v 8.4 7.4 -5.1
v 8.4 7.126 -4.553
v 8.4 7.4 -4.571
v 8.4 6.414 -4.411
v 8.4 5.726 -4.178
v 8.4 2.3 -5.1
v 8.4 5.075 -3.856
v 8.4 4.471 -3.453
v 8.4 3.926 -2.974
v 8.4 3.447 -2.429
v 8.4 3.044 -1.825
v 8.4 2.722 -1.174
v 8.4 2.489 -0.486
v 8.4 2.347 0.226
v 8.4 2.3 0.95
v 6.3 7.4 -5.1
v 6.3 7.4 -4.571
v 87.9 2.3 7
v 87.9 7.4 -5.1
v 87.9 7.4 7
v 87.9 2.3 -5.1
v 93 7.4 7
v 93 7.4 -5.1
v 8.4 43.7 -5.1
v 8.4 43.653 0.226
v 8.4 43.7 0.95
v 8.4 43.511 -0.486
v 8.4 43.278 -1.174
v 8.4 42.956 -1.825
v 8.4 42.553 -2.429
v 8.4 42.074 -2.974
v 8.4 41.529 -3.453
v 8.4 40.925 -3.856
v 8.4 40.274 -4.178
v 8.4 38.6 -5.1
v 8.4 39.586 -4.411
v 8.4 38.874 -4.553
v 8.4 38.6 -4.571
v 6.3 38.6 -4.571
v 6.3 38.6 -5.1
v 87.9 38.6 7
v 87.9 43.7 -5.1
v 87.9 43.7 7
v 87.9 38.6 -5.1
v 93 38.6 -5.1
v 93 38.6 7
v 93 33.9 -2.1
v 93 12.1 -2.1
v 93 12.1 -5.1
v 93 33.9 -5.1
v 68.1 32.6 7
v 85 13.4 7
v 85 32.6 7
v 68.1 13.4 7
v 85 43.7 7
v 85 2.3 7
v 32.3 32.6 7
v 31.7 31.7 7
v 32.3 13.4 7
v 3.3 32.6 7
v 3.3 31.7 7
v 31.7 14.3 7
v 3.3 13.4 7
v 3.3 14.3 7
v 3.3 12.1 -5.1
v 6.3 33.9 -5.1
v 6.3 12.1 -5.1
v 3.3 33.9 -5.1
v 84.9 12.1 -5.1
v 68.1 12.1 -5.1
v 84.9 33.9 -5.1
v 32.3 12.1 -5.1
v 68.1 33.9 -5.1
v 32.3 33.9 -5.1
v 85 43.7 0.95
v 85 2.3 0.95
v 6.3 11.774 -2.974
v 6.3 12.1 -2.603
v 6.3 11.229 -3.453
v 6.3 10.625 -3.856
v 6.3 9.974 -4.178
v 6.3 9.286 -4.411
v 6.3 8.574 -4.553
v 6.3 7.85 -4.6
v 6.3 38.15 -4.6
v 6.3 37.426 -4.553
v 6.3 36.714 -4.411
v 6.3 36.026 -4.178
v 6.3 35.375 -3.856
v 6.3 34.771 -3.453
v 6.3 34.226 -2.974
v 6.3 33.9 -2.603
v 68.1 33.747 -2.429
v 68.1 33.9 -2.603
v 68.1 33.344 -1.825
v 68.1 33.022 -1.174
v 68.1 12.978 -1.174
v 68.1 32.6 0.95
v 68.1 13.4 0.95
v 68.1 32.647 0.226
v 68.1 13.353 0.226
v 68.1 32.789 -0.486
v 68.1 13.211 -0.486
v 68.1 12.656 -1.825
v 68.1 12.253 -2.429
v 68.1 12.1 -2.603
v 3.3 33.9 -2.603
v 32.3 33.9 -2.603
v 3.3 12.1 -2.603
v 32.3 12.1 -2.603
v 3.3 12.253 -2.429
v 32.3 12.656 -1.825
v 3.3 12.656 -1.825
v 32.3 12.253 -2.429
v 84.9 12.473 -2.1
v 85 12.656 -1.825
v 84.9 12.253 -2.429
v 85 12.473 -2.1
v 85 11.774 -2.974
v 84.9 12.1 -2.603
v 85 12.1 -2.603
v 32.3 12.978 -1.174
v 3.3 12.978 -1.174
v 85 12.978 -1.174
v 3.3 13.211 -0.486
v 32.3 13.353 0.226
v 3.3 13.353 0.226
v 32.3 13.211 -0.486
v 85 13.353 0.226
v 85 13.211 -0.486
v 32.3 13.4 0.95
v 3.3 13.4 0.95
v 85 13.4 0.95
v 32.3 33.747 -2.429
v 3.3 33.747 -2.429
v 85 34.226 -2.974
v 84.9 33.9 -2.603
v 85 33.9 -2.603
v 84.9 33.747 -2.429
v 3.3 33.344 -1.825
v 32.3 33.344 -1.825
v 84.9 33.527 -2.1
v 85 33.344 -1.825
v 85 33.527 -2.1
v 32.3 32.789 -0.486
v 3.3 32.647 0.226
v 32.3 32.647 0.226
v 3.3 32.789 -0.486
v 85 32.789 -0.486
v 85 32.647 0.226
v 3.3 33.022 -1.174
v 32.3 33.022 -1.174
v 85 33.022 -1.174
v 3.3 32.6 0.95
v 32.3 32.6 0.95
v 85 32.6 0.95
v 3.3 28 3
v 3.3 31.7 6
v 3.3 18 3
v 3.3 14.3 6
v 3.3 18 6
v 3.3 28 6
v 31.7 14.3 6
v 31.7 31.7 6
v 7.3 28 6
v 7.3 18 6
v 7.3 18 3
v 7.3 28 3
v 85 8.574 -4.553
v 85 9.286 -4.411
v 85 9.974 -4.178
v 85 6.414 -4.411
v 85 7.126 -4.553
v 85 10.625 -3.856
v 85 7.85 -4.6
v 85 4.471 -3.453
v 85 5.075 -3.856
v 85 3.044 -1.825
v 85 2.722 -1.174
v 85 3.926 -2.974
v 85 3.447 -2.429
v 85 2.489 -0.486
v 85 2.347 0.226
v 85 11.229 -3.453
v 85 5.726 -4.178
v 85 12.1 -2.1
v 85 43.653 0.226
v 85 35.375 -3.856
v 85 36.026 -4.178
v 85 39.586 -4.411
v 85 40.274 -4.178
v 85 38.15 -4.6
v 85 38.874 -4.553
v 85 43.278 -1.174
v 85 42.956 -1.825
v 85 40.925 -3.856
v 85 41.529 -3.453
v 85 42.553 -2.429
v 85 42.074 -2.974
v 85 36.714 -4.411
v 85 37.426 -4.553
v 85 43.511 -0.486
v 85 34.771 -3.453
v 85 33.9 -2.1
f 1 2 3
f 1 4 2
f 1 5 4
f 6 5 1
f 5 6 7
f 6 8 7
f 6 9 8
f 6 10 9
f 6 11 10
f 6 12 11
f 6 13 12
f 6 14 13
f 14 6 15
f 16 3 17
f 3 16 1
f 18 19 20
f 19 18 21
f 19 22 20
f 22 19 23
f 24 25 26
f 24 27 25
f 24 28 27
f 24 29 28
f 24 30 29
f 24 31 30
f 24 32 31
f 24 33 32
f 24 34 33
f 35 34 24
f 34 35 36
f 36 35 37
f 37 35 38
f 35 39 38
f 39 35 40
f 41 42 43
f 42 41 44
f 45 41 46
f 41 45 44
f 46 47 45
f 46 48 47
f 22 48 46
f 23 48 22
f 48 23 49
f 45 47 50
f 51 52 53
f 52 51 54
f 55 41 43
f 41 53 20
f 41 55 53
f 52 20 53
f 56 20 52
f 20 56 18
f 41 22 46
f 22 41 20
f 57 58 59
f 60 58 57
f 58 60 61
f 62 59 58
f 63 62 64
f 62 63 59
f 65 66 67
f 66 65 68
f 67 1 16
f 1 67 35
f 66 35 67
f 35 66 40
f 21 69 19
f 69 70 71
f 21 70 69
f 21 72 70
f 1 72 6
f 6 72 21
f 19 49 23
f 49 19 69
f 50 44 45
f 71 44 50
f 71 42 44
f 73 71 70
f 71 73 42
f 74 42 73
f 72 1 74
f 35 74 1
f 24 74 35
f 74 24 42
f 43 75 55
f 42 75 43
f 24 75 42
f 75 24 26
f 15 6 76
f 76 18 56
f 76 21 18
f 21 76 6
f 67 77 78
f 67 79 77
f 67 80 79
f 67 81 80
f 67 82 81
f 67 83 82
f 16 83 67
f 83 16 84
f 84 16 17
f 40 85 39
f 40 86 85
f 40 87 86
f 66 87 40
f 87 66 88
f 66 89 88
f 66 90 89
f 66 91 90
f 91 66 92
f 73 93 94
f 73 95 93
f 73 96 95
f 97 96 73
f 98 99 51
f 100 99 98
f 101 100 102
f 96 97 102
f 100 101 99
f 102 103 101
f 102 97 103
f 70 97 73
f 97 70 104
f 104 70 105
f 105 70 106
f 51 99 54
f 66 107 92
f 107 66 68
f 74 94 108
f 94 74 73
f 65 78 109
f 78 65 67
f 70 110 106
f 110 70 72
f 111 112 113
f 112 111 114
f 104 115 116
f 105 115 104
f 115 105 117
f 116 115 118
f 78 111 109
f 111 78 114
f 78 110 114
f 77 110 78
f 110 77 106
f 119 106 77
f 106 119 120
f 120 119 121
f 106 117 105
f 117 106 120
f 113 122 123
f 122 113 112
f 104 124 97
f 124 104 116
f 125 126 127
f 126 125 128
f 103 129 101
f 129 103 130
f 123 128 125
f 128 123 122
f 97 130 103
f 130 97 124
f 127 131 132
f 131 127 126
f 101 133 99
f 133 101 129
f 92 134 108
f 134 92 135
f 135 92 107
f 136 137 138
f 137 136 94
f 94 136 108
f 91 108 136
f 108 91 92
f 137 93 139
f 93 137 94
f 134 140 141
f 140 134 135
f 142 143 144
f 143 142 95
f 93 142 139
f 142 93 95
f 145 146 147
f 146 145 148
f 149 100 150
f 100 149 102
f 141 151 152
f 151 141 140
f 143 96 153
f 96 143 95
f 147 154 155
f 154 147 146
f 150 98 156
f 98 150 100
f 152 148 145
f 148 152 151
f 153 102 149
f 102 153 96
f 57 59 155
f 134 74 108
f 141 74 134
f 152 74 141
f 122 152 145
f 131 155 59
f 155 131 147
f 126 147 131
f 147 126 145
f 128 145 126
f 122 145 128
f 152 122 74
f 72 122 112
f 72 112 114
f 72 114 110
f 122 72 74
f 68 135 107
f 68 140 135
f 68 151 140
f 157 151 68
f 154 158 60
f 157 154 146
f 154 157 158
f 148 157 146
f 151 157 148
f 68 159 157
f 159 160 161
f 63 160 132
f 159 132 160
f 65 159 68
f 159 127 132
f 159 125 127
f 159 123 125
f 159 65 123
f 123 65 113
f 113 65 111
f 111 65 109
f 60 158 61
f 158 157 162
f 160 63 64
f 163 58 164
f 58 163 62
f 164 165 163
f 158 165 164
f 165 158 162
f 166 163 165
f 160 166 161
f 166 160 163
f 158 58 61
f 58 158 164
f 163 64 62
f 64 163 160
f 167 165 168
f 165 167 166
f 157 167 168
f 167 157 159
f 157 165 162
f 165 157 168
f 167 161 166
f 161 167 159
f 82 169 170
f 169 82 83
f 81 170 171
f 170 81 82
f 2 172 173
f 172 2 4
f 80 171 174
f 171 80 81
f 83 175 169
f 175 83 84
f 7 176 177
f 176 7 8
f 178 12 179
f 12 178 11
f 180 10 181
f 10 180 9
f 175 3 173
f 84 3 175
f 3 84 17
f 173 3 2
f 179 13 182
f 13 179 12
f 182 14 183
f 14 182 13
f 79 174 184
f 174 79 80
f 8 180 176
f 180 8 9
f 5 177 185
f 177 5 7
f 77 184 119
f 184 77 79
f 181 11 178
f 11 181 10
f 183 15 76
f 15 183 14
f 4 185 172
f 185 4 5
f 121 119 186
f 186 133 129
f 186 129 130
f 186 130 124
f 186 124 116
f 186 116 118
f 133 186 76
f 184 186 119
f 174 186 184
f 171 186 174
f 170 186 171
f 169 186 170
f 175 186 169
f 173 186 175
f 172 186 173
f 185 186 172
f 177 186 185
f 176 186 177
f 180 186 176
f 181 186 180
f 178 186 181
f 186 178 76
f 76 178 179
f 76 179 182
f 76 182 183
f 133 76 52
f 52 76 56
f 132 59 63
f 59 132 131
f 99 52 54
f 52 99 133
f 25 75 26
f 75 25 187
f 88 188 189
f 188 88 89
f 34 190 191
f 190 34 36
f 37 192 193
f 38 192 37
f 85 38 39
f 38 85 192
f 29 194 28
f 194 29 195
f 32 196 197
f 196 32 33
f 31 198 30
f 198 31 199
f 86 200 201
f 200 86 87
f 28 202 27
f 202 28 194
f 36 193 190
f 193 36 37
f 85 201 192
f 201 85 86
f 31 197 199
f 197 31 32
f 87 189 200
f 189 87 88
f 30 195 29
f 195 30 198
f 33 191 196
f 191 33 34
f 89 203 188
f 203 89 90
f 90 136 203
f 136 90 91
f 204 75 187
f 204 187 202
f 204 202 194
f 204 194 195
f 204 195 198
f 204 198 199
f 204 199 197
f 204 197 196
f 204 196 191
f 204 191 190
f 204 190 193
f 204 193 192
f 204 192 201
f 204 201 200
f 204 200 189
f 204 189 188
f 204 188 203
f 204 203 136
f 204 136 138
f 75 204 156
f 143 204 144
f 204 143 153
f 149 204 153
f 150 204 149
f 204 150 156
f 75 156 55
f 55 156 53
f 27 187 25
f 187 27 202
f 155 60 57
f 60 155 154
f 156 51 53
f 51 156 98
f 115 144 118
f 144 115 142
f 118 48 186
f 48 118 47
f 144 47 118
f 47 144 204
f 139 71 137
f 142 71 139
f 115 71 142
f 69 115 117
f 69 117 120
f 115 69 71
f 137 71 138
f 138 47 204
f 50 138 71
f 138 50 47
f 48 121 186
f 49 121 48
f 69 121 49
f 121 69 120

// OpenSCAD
// Dilder Rev 2 "extended with joystick" — AAA CRADLE INSERT v1
//
// A drop-in plug shaped like the NEGATIVE SPACE of top-cover-windowed-
// screen-inlay-v3-2piece's interior. Slides up into the cover's mating
// bottom; top surface lands flush against the face-plate/display-back
// plane at cover-local z = 7 ("the plane of the screen face").
//
// Features carved INTO the plug:
//   - 3 mm-wide FPC gap on the -X (opposite-the-joystick) edge, full Y
//     and full Z, so the display's FPC cable can exit toward -X.
//   - 2 AAA cell indentations laid along X, stacked in Y, pushed to the
//     +X (joystick-side) end of the plug.
//   - Central rectangular cutout that lets the Pico W nest up against
//     the Waveshare's back, between the two AAA cells.
//
// Plug height is set by the AAA diameter (10.5 mm + 0.3 slop per side →
// 11.1 mm bay) rather than the cover's 7 mm inner cavity — so the plug
// is TALLER than the cover's cavity. Its top 7 mm slide into the cover
// cavity; the bottom 4.6 mm extends BELOW the cover mating plane, into
// the base's Pico-chamber region (Y = 12.1–33.9), which is open there.
//
// Export:
//   openscad -o aaa-cradle-insert-v1.3mf aaa-cradle-insert-v1.scad

$fn = 48;

// ============================================================
// Match the cover / base shell parameters
// ============================================================
enclosure_outer_width_along_x_axis_mm          = 94.5;   // was 91.5 — +3 mm on -X side for TP4056
enclosure_outer_depth_along_y_axis_mm          = 46;
minus_x_end_wall_thickness_mm                  = 3.0;
plus_x_end_wall_thickness_mm                   = 1.2;
perimeter_long_side_wall_thickness_y_mm_base   = 2;
corner_pillar_square_side_length_mm            = 5;

// Cover cavity inner bounds (the space the plug fills)
cavity_inner_x_start_mm = minus_x_end_wall_thickness_mm;                         // = 3.0
cavity_inner_x_end_mm =
    enclosure_outer_width_along_x_axis_mm
      - plus_x_end_wall_thickness_mm;                                            // = 90.3
cavity_inner_y_start_mm = perimeter_long_side_wall_thickness_y_mm_base;          // = 2.0
cavity_inner_y_end_mm =
    enclosure_outer_depth_along_y_axis_mm
      - perimeter_long_side_wall_thickness_y_mm_base;                            // = 44.0

// Plug outer footprint = cavity − a tiny slide-in slop on every wall.
plug_wall_slop_mm                              = 0.3;
plug_x_start_mm = cavity_inner_x_start_mm + plug_wall_slop_mm;                   // = 3.3
plug_x_end_mm   = cavity_inner_x_end_mm   - plug_wall_slop_mm;                   // = 90.0
plug_y_start_mm = cavity_inner_y_start_mm + plug_wall_slop_mm;                   // = 2.3
plug_y_end_mm   = cavity_inner_y_end_mm   - plug_wall_slop_mm;                   // = 43.7

// ============================================================
// Plug Z — top meets the face-plate bottom (= display back = "plane of
// screen face"), bottom extends below cover mating bottom as needed to
// fully cradle the AAAs.
// ============================================================
face_plate_bottom_z_in_cover_local_mm          = 7;     // from cover-v3-2piece
aaa_cell_diameter_mm                           = 10.5;
aaa_cell_radial_slop_mm                        = 0.3;
aaa_bay_diameter_mm =
    aaa_cell_diameter_mm + 2 * aaa_cell_radial_slop_mm;  // = 11.1
aaa_bay_wall_above_and_below_mm                = 0.5;    // min wall at ±Z of cell

plug_thickness_mm =
    aaa_bay_diameter_mm + 2 * aaa_bay_wall_above_and_below_mm;  // = 12.1
plug_top_z_mm = face_plate_bottom_z_in_cover_local_mm;          // = 7
plug_bottom_z_mm = plug_top_z_mm - plug_thickness_mm;           // = -5.1 (extends
                                                                 // into base below)

// ============================================================
// AAA cells — 2 cells laying along X, stacked in Y, both pushed to
// +X (the joystick side). Cell-to-cell divider 1 mm thick.
// ============================================================
aaa_cell_length_mm                             = 44.5;
aaa_cell_axial_slop_mm                         = 1.0;
aaa_cell_contact_space_per_end_mm              = 2.0;
aaa_bay_length_along_x_mm =
    aaa_cell_length_mm
      + 2 * aaa_cell_contact_space_per_end_mm
      + aaa_cell_axial_slop_mm;                          // = 49.5

// +X end of the bay is pulled 3 mm -X past the +X corner-pillar
// cutout's -X edge, so the bays don't run into the pillar footprint.
plus_x_pillar_cutout_minus_x_edge_mm =
    (enclosure_outer_width_along_x_axis_mm
       - plus_x_end_wall_thickness_mm
       - corner_pillar_square_side_length_mm)
      - 0.4;                                                                      // = 84.9 (slop applied below)
aaa_bay_gap_from_pillar_cutout_mm              = 3.0;
aaa_bay_plus_x_end_mm =
    plus_x_pillar_cutout_minus_x_edge_mm
      - aaa_bay_gap_from_pillar_cutout_mm;                                         // = 81.9
aaa_bay_minus_x_start_mm =
    aaa_bay_plus_x_end_mm - aaa_bay_length_along_x_mm;                             // = 32.4

// Bays pushed apart until each cell's outer surface touches the plug's
// long-side edge. Cover / base inner wall provides +/-Y retention
// outside the plug.
aaa_bay_minus_y_center_y_mm =
    plug_y_start_mm + aaa_bay_diameter_mm / 2;                                     // = 7.85
aaa_bay_plus_y_center_y_mm =
    plug_y_end_mm - aaa_bay_diameter_mm / 2;                                       // = 38.15
aaa_bay_center_z_mm =
    (plug_top_z_mm + plug_bottom_z_mm) / 2;                                        // ≈ 0.95

// Top-open cut: the plug material from the cell's equator up through
// the plug top gets removed in each bay's XY bounding box, so the cell
// can be placed INTO the bay from above rather than slid in end-on.
aaa_bay_top_open_z_bottom_mm                   = aaa_bay_center_z_mm;
aaa_bay_top_open_z_top_mm                      = plug_top_z_mm + 0.1;

// ============================================================
// FPC gap — 3 mm of -X edge material shaved off, full Y, full plug Z,
// so the display's FPC cable can exit straight toward -X.
// ============================================================
fpc_gap_width_along_x_mm                       = 3;

// ============================================================
// Pico nest — central rectangular cutout from the TOP of the plug
// downward. Gives the Pico W somewhere to sit against the Waveshare's
// back (between the two AAA cells).
// ============================================================
pico_w_board_width_along_y_mm                  = 21.0;
// Pico nest length reduced 10 mm (from 51 to 41) so the middle block
// doesn't eat quite as far +X into the plug.
pico_w_board_length_along_x_mm                 = 61.0;
print_fit_tolerance_slop_mm                    = 0.4;
pico_nest_width_along_y_mm =
    pico_w_board_width_along_y_mm + 2 * print_fit_tolerance_slop_mm;              // = 21.8
pico_nest_length_along_x_mm =
    pico_w_board_length_along_x_mm + 2 * print_fit_tolerance_slop_mm;             // = 51.8
// Pico board + its tallest stacked components (headers) — full plug Z
// so the Pico nests all the way through vertically, free to sit against
// the Waveshare's back above and extend down toward the base below.
pico_nest_depth_along_z_mm                     = plug_thickness_mm;

// Pico nest is X-centered between the FPC gap and the AAA bays (so the
// Pico sits in the middle of the -X / +X extent of the plug).
pico_nest_x_region_start_mm =
    plug_x_start_mm + fpc_gap_width_along_x_mm;                                   // = 6.3
pico_nest_x_region_end_mm   = aaa_bay_minus_x_start_mm;                           // = 40.5
pico_nest_x_start_mm =
    (pico_nest_x_region_start_mm + pico_nest_x_region_end_mm) / 2
      - pico_nest_length_along_x_mm / 2;                                          // = -2.5 (overshoots)
// If the Pico's 51.8 mm footprint doesn't fit between the FPC gap end
// (x = 6.3) and the AAA bays' -X start (x = 40.5 → 34.2 mm of X), the
// nest gets clamped to start at the FPC gap end and extends as far +X
// as the board needs. The Pico ends up passing UNDER the AAA bays'
// footprint; since the bay pockets are higher in Z than the Pico nest
// bottom, that's fine — the Pico's -X end fills the plug's center and
// its +X end slides under the AAA bays.
pico_nest_x_start_clamped_mm =
    max(pico_nest_x_start_mm, pico_nest_x_region_start_mm);
pico_nest_y_start_mm =
    enclosure_outer_depth_along_y_axis_mm / 2
      - pico_nest_width_along_y_mm / 2;                                           // = 12.1

// ============================================================
// -X middle inset — a shallow pocket on the -X end of the plug's long
// axis, mirroring the Pico-nest footprint but only 9.5 mm long in X
// and 3 mm shorter in height than the full plug so it's a blind pocket
// rather than a through-slot. Opens from the top.
// ============================================================
minus_x_inset_length_along_x_mm                = 29;     // was 9.5 — extended for TP4056 board (28 mm + margin)
minus_x_inset_height_reduction_from_plug_mm    = 0;      // was 3.0 — full plug height now
minus_x_inset_depth_along_z_mm =
    plug_thickness_mm - minus_x_inset_height_reduction_from_plug_mm;               // = 9.1
minus_x_inset_x_start_mm                       = plug_x_start_mm;                  // = 3.3
minus_x_inset_x_end_mm =
    minus_x_inset_x_start_mm + minus_x_inset_length_along_x_mm;                    // = 12.8
minus_x_inset_y_start_mm                       = pico_nest_y_start_mm;             // = 12.1
minus_x_inset_y_end_mm =
    minus_x_inset_y_start_mm + pico_nest_width_along_y_mm;                         // = 33.9
minus_x_inset_z_top_mm                         = plug_top_z_mm;                    // = 7.0
minus_x_inset_z_bottom_mm =
    minus_x_inset_z_top_mm - minus_x_inset_depth_along_z_mm;                       // = -2.1

// ============================================================
// Connecting block — solid material ADDED on the +X edge of the -X
// inset (the edge opposite the plug edge closest to the origin).
// Bridges the -X inset region into the rest of the plug, filling part
// of the Pico-nest footprint back in. Same Y band and Z depth as the
// -X inset; 9.5 mm long in X; 9.1 mm tall (3 mm shorter than full
// plug Z), so it leaves a 3 mm gap below the block inside the Pico
// nest (a small cable-pass channel at the bottom).
// ============================================================
connecting_block_length_along_x_mm             = 29;     // was 9.5 — accommodate TP4056 (28 mm board + margin)
connecting_block_height_reduction_from_plug_mm = 0;      // was 3.0 — extend to full plug height
connecting_block_height_along_z_mm =
    plug_thickness_mm - connecting_block_height_reduction_from_plug_mm;            // = 9.1
// Block placed AT the -X inset's short side closest to the origin
// (the inset's -X face at X=3.3). Block X range matches the inset's
// X range so the block fills the inset with solid material from
// the -X side.
connecting_block_x_start_mm                    = minus_x_inset_x_start_mm;         // = 3.3
connecting_block_x_end_mm =
    connecting_block_x_start_mm + connecting_block_length_along_x_mm;              // = 12.8
connecting_block_y_start_mm                    = minus_x_inset_y_start_mm;         // = 12.1
connecting_block_y_end_mm                      = minus_x_inset_y_end_mm;           // = 33.9
connecting_block_z_top_mm                      = plug_top_z_mm;                    // = 7.0
connecting_block_z_bottom_mm =
    connecting_block_z_top_mm - connecting_block_height_along_z_mm;                // = -2.1

// ============================================================
// +X display connector cutout — 3 mm pocket from the plug top on
// the +X short face (furthest from origin), same Y band as the
// Pico nest. Gives clearance for the Waveshare display's FPC
// connector and ribbon cable.
// ============================================================
plus_x_cutout_depth_z_mm                       = 3;
plus_x_cutout_z_bottom_mm                      = plug_bottom_z_mm;        // = -5.1
plus_x_cutout_z_top_mm =
    plug_bottom_z_mm + plus_x_cutout_depth_z_mm;                          // = -2.1
plus_x_cutout_x_start_mm                       = aaa_bay_plus_x_end_mm;   // starts where bays end
plus_x_cutout_x_end_mm                         = plug_x_end_mm;

// ============================================================
// TP4056 USB-C charge board — 1 mm indent on the connecting block's
// top face so the board sits recessed.
// ============================================================
tp4056_board_length_along_x_mm                 = 28;
tp4056_board_width_along_y_mm                  = 17;
tp4056_indent_depth_z_mm                       = 1.0;
tp4056_indent_slop_per_edge_mm                 = 0.2;

tp4056_indent_x_start_mm                       = connecting_block_x_start_mm;
tp4056_indent_length_mm =
    tp4056_board_length_along_x_mm + 2 * tp4056_indent_slop_per_edge_mm;   // = 28.4
tp4056_indent_width_mm =
    tp4056_board_width_along_y_mm + 2 * tp4056_indent_slop_per_edge_mm;    // = 17.4
tp4056_indent_y_start_mm =
    (connecting_block_y_start_mm + connecting_block_y_end_mm) / 2
      - tp4056_indent_width_mm / 2;                                        // ≈ 14.3
tp4056_indent_z_bottom_mm =
    plug_top_z_mm - tp4056_indent_depth_z_mm;                              // = 6.0

// USB-C port cutout through the connecting block's -X face
usb_c_port_cutout_width_y_mm                   = 10;
usb_c_port_cutout_height_z_mm                  = 5;
usb_c_port_cutout_center_y_mm =
    enclosure_outer_depth_along_y_axis_mm / 2;                             // = 23
usb_c_port_cutout_center_z_mm                  = 5.5;

// ============================================================
// Corner pillar cutouts — plug wraps around the cover's 4 corner
// pillars. Cut generously so the plug doesn't bind on pillars during
// slide-in.
// ============================================================
corner_pillar_cutout_slop_mm                   = 0.4;
corner_pillar_cutout_xy_positions = [
    [minus_x_end_wall_thickness_mm,
     perimeter_long_side_wall_thickness_y_mm_base],
    [enclosure_outer_width_along_x_axis_mm
       - plus_x_end_wall_thickness_mm
       - corner_pillar_square_side_length_mm,
     perimeter_long_side_wall_thickness_y_mm_base],
    [minus_x_end_wall_thickness_mm,
     enclosure_outer_depth_along_y_axis_mm
       - perimeter_long_side_wall_thickness_y_mm_base
       - corner_pillar_square_side_length_mm],
    [enclosure_outer_width_along_x_axis_mm
       - plus_x_end_wall_thickness_mm
       - corner_pillar_square_side_length_mm,
     enclosure_outer_depth_along_y_axis_mm
       - perimeter_long_side_wall_thickness_y_mm_base
       - corner_pillar_square_side_length_mm],
];


// ========== AAA cradle insert ==========

module aaa_cradle_insert() {
    // Outer difference: AAA bay cuts applied LAST so they cut through
    // both the main plug body AND the connecting block (no residual
    // walls at the junction).
    difference() {
    union() {
    difference() {
        // Main plug body
        translate([plug_x_start_mm, plug_y_start_mm, plug_bottom_z_mm])
            cube([plug_x_end_mm - plug_x_start_mm,
                  plug_y_end_mm - plug_y_start_mm,
                  plug_thickness_mm]);

        // Corner pillar cutouts (4)
        for (xy = corner_pillar_cutout_xy_positions) {
            translate([xy[0] - corner_pillar_cutout_slop_mm,
                       xy[1] - corner_pillar_cutout_slop_mm,
                       plug_bottom_z_mm - 0.1])
                cube([corner_pillar_square_side_length_mm + 2 * corner_pillar_cutout_slop_mm,
                      corner_pillar_square_side_length_mm + 2 * corner_pillar_cutout_slop_mm,
                      plug_thickness_mm + 0.2]);
        }

        // FPC gap — shave 3 mm off the -X edge, full Y, full plug Z.
        translate([plug_x_start_mm - 0.1,
                   plug_y_start_mm - 0.1,
                   plug_bottom_z_mm - 0.1])
            cube([fpc_gap_width_along_x_mm + 0.1,
                  plug_y_end_mm - plug_y_start_mm + 0.2,
                  plug_thickness_mm + 0.2]);

        // Pico nest — central rectangular through-slot (full plug Z),
        // between the two AAA bays in Y, starting past the FPC gap in X.
        translate([pico_nest_x_start_clamped_mm,
                   pico_nest_y_start_mm,
                   plug_bottom_z_mm - 0.1])
            cube([pico_nest_length_along_x_mm,
                  pico_nest_width_along_y_mm,
                  plug_thickness_mm + 0.2]);

        // -X middle inset — pocket opening from the top of the plug,
        // on the -X end of the plug's long axis.
        translate([minus_x_inset_x_start_mm,
                   minus_x_inset_y_start_mm,
                   minus_x_inset_z_bottom_mm])
            cube([minus_x_inset_x_end_mm - minus_x_inset_x_start_mm,
                  minus_x_inset_y_end_mm - minus_x_inset_y_start_mm,
                  minus_x_inset_z_top_mm - minus_x_inset_z_bottom_mm + 0.1]);
    }

    // Connecting block — added AFTER the plug cuts so it survives
    // inside the Pico nest's footprint. Battery curves, TP4056
    // indent, and USB-C cutout are subtracted from the block itself.
    difference() {
        translate([connecting_block_x_start_mm,
                   connecting_block_y_start_mm,
                   connecting_block_z_bottom_mm])
            cube([connecting_block_x_end_mm - connecting_block_x_start_mm,
                  connecting_block_y_end_mm - connecting_block_y_start_mm,
                  connecting_block_z_top_mm - connecting_block_z_bottom_mm]);

        // Concave battery-following curves on ±Y faces
        for (bay_y_center = [aaa_bay_minus_y_center_y_mm,
                             aaa_bay_plus_y_center_y_mm]) {
            translate([connecting_block_x_start_mm - 0.1,
                       bay_y_center,
                       aaa_bay_center_z_mm])
                rotate([0, 90, 0])
                    cylinder(h = connecting_block_x_end_mm
                                   - connecting_block_x_start_mm + 0.2,
                             r = aaa_bay_diameter_mm / 2);
        }

        // TP4056 indent — 1 mm recess on the top face
        translate([tp4056_indent_x_start_mm,
                   tp4056_indent_y_start_mm,
                   tp4056_indent_z_bottom_mm])
            cube([tp4056_indent_length_mm,
                  tp4056_indent_width_mm,
                  tp4056_indent_depth_z_mm + 0.1]);

        // USB-C port cutout through the -X face
        translate([connecting_block_x_start_mm - 1,
                   usb_c_port_cutout_center_y_mm
                     - usb_c_port_cutout_width_y_mm / 2,
                   usb_c_port_cutout_center_z_mm
                     - usb_c_port_cutout_height_z_mm / 2])
            cube([fpc_gap_width_along_x_mm + 2,
                  usb_c_port_cutout_width_y_mm,
                  usb_c_port_cutout_height_z_mm]);
    }
    } // end union

    // AAA cell bays — cut AFTER the connecting block is added so the
    // battery channels pass cleanly through everything including
    // the connecting block's ±Y overlap strips.
    aaa_bay_extended_minus_x_mm = plug_x_start_mm;
    aaa_bay_extended_length_mm =
        aaa_bay_plus_x_end_mm - aaa_bay_extended_minus_x_mm;
    for (bay_y_center_mm = [aaa_bay_minus_y_center_y_mm,
                            aaa_bay_plus_y_center_y_mm]) {
        // Cylinder cut
        translate([aaa_bay_extended_minus_x_mm - 0.1,
                   bay_y_center_mm,
                   aaa_bay_center_z_mm])
            rotate([0, 90, 0])
                cylinder(h = aaa_bay_extended_length_mm + 0.2,
                         d = aaa_bay_diameter_mm);

        // Top-open rectangular cut
        bay_y_start_mm = bay_y_center_mm - aaa_bay_diameter_mm / 2;
        translate([aaa_bay_extended_minus_x_mm - 0.1,
                   bay_y_start_mm,
                   aaa_bay_top_open_z_bottom_mm])
            cube([aaa_bay_extended_length_mm + 0.2,
                  aaa_bay_diameter_mm,
                  aaa_bay_top_open_z_top_mm - aaa_bay_top_open_z_bottom_mm]);
    }
    // +X display connector cutout — 3 mm pocket from the bottom face
    // at the +X short side for FPC connector / cable clearance.
    translate([plus_x_cutout_x_start_mm,
               pico_nest_y_start_mm,
               plus_x_cutout_z_bottom_mm - 0.1])
        cube([plus_x_cutout_x_end_mm - plus_x_cutout_x_start_mm + 0.1,
              pico_nest_width_along_y_mm,
              plus_x_cutout_depth_z_mm + 0.1]);

    } // end outer difference
}

aaa_cradle_insert();
